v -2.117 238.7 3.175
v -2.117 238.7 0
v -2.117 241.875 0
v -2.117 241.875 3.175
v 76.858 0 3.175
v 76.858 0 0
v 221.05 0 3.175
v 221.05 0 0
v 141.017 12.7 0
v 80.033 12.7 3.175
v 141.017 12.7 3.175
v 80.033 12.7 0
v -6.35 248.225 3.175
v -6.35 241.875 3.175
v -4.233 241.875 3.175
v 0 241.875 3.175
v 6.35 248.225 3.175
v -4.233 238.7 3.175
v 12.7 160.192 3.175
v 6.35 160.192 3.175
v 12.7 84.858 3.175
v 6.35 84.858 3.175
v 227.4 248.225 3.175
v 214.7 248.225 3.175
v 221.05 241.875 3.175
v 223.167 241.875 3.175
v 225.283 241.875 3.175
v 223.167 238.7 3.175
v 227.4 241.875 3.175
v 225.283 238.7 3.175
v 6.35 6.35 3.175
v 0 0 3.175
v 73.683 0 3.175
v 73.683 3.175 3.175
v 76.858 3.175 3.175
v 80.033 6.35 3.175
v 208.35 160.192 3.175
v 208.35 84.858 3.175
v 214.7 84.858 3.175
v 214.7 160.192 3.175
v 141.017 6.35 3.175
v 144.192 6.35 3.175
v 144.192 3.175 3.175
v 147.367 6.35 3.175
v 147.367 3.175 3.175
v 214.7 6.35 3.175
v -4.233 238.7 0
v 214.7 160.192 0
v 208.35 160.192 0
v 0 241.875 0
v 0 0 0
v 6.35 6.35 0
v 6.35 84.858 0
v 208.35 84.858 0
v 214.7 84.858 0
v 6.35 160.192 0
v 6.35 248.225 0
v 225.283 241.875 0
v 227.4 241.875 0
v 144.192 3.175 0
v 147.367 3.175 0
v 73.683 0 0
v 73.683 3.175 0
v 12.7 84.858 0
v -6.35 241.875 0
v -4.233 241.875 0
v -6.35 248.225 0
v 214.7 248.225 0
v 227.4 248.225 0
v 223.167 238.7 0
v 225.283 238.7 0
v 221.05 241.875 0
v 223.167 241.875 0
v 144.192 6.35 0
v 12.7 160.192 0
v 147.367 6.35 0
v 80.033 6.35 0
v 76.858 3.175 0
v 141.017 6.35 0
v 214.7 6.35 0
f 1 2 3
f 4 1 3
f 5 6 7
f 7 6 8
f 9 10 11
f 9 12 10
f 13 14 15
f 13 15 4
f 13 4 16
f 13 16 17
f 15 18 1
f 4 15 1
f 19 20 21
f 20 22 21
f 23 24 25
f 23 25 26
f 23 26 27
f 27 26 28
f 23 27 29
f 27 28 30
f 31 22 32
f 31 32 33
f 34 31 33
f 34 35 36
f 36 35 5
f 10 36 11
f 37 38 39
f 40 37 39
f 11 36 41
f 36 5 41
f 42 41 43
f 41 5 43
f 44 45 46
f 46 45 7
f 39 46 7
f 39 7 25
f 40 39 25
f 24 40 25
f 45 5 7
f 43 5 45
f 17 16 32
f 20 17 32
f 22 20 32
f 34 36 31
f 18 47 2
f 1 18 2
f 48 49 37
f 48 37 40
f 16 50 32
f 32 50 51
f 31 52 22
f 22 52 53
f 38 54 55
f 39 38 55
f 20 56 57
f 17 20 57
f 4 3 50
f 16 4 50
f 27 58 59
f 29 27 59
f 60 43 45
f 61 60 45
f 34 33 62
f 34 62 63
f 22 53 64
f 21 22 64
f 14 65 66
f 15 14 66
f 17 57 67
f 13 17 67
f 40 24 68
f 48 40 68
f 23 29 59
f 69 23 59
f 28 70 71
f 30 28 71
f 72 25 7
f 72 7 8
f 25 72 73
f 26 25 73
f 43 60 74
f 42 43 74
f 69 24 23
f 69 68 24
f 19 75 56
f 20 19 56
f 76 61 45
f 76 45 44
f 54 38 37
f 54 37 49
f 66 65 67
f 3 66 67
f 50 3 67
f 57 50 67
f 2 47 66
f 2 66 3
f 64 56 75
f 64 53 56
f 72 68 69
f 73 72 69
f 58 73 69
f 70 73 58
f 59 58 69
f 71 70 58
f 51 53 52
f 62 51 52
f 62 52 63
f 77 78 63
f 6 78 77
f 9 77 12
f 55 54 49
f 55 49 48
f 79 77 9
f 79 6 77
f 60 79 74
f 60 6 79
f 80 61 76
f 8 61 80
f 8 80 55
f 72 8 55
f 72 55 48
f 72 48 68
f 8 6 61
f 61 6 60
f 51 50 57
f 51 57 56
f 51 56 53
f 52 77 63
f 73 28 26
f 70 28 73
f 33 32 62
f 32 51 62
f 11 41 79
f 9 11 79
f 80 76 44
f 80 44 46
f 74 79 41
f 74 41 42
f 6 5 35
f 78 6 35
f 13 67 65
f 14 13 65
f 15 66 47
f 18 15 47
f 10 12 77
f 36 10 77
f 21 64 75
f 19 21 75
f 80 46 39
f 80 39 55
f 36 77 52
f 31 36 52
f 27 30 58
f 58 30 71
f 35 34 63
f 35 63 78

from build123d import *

# Parameters (mm, degrees)
BOSS_EXTRUDE1_DEPTH = 3.175
MIRROR1_OUTLINE_W   = 6.35
MIRROR1_OUTLINE_H   = 3.175
MIRROR1_DEPTH       = 248.225
MIRROR1_2_OUTLINE_W = 104.175
MIRROR1_2_OUTLINE_H = 3.175
MIRROR1_2_DEPTH     = 6.35
MIRROR1_START       = 84.858333333
MIRROR1_3_OUTLINE_W = 6.35
MIRROR1_3_OUTLINE_H = 3.175
MIRROR1_3_DEPTH     = 75.333333334
MIRROR1_START_2     = 6.35
MIRROR1_4_OUTLINE_W = 30.491666667
MIRROR1_4_OUTLINE_H = 3.175
MIRROR1_4_DEPTH     = 6.35
MIRROR1_START_3     = 241.875
MIRROR1_5_OUTLINE_W = 6.35
MIRROR1_5_OUTLINE_H = 3.175
MIRROR1_5_DEPTH     = 6.35
MIRROR1_START_4     = 238.7
MIRROR1_6_OUTLINE_W = 2.116666666
MIRROR1_6_OUTLINE_H = 3.175
MIRROR1_6_DEPTH     = 3.175
SKETCH2_W           = 3.175
SKETCH2_H           = 3.175
CUT_EXTRUDE1_DEPTH  = 3.175


# Read off the part's stored shape, not the designer's step: Mirror1
with BuildPart() as part:
    # Sketch1 → Boss-Extrude1 (new body)
    with BuildSketch(Plane.XY):
        Polygon((6.35, 232.35), (0, 232.35), (0, 0), (110.525, 0), (110.525, 12.7), (80.033333333, 12.7), (80.033333333, 6.35), (6.35, 6.35), (6.35, 84.858333333), (12.7, 84.858333333), (12.7, 160.191666667), (6.35, 160.191666667), align=None)
        Polygon((-2.116666667, 241.875), (0, 241.875), (0, 232.35), (6.35, 232.35), (6.35, 248.225), (-6.35, 248.225), (-6.35, 241.875), (-4.233333333, 241.875), (-4.233333333, 238.7), (-2.116666667, 238.7), align=None)
    extrude(amount=BOSS_EXTRUDE1_DEPTH)



with BuildPart() as body_2:
    # Mirror1 outline → Mirror1 (new body)
    with BuildSketch(Plane(origin=(0, 0, 0), x_dir=(1, 0, 0), z_dir=(0, 1, 0))):
        with Locations((217.875, -1.5875)):
            Rectangle(MIRROR1_OUTLINE_W, MIRROR1_OUTLINE_H)
    extrude(amount=MIRROR1_DEPTH)


with BuildPart() as part_1:
    add(part.part)

    add(body_2.part)  # Mirror1 2 merges body 2
    # Mirror1 2 outline → Mirror1 2 (add)
    with BuildSketch(Plane(origin=(0, 0, 0), x_dir=(1, 0, 0), z_dir=(0, 1, 0))):
        with Locations((162.6125, -1.5875)):
            Rectangle(MIRROR1_2_OUTLINE_W, MIRROR1_2_OUTLINE_H)
    extrude(amount=MIRROR1_2_DEPTH)

    # Mirror1 3 outline → Mirror1 3 (add)
    with BuildSketch(Plane(origin=(0, 0, 0), x_dir=(1, 0, 0), z_dir=(0, 1, 0)).offset(MIRROR1_START)):
        with Locations((211.525, -1.5875)):
            Rectangle(MIRROR1_3_OUTLINE_W, MIRROR1_3_OUTLINE_H)
    extrude(amount=MIRROR1_3_DEPTH)

    # Mirror1 4 outline → Mirror1 4 (add)
    with BuildSketch(Plane(origin=(0, 0, 0), x_dir=(1, 0, 0), z_dir=(0, 1, 0)).offset(MIRROR1_START_2)):
        with Locations((125.770833334, -1.5875)):
            Rectangle(MIRROR1_4_OUTLINE_W, MIRROR1_4_OUTLINE_H)
    extrude(amount=MIRROR1_4_DEPTH)

    # Mirror1 5 outline → Mirror1 5 (add)
    with BuildSketch(Plane(origin=(0, 0, 0), x_dir=(1, 0, 0), z_dir=(0, 1, 0)).offset(MIRROR1_START_3)):
        with Locations((224.225, -1.5875)):
            Rectangle(MIRROR1_5_OUTLINE_W, MIRROR1_5_OUTLINE_H)
    extrude(amount=MIRROR1_5_DEPTH)

    # Mirror1 6 outline → Mirror1 6 (add)
    with BuildSketch(Plane(origin=(0, 0, 0), x_dir=(1, 0, 0), z_dir=(0, 1, 0)).offset(MIRROR1_START_4)):
        with Locations((224.225, -1.5875)):
            Rectangle(MIRROR1_6_OUTLINE_W, MIRROR1_6_OUTLINE_H)
    extrude(amount=MIRROR1_6_DEPTH)

    # Sketch2 → Cut-Extrude1 (cut)
    with BuildSketch(Plane.XY.offset(3.175)):
        with Locations((75.270833333, 1.5875)):
            Rectangle(SKETCH2_W, SKETCH2_H)
        with Locations((145.779166667, 4.7625)):
            Rectangle(SKETCH2_W, SKETCH2_H)
    extrude(amount=-CUT_EXTRUDE1_DEPTH, mode=Mode.SUBTRACT)


solid = part_1.part
